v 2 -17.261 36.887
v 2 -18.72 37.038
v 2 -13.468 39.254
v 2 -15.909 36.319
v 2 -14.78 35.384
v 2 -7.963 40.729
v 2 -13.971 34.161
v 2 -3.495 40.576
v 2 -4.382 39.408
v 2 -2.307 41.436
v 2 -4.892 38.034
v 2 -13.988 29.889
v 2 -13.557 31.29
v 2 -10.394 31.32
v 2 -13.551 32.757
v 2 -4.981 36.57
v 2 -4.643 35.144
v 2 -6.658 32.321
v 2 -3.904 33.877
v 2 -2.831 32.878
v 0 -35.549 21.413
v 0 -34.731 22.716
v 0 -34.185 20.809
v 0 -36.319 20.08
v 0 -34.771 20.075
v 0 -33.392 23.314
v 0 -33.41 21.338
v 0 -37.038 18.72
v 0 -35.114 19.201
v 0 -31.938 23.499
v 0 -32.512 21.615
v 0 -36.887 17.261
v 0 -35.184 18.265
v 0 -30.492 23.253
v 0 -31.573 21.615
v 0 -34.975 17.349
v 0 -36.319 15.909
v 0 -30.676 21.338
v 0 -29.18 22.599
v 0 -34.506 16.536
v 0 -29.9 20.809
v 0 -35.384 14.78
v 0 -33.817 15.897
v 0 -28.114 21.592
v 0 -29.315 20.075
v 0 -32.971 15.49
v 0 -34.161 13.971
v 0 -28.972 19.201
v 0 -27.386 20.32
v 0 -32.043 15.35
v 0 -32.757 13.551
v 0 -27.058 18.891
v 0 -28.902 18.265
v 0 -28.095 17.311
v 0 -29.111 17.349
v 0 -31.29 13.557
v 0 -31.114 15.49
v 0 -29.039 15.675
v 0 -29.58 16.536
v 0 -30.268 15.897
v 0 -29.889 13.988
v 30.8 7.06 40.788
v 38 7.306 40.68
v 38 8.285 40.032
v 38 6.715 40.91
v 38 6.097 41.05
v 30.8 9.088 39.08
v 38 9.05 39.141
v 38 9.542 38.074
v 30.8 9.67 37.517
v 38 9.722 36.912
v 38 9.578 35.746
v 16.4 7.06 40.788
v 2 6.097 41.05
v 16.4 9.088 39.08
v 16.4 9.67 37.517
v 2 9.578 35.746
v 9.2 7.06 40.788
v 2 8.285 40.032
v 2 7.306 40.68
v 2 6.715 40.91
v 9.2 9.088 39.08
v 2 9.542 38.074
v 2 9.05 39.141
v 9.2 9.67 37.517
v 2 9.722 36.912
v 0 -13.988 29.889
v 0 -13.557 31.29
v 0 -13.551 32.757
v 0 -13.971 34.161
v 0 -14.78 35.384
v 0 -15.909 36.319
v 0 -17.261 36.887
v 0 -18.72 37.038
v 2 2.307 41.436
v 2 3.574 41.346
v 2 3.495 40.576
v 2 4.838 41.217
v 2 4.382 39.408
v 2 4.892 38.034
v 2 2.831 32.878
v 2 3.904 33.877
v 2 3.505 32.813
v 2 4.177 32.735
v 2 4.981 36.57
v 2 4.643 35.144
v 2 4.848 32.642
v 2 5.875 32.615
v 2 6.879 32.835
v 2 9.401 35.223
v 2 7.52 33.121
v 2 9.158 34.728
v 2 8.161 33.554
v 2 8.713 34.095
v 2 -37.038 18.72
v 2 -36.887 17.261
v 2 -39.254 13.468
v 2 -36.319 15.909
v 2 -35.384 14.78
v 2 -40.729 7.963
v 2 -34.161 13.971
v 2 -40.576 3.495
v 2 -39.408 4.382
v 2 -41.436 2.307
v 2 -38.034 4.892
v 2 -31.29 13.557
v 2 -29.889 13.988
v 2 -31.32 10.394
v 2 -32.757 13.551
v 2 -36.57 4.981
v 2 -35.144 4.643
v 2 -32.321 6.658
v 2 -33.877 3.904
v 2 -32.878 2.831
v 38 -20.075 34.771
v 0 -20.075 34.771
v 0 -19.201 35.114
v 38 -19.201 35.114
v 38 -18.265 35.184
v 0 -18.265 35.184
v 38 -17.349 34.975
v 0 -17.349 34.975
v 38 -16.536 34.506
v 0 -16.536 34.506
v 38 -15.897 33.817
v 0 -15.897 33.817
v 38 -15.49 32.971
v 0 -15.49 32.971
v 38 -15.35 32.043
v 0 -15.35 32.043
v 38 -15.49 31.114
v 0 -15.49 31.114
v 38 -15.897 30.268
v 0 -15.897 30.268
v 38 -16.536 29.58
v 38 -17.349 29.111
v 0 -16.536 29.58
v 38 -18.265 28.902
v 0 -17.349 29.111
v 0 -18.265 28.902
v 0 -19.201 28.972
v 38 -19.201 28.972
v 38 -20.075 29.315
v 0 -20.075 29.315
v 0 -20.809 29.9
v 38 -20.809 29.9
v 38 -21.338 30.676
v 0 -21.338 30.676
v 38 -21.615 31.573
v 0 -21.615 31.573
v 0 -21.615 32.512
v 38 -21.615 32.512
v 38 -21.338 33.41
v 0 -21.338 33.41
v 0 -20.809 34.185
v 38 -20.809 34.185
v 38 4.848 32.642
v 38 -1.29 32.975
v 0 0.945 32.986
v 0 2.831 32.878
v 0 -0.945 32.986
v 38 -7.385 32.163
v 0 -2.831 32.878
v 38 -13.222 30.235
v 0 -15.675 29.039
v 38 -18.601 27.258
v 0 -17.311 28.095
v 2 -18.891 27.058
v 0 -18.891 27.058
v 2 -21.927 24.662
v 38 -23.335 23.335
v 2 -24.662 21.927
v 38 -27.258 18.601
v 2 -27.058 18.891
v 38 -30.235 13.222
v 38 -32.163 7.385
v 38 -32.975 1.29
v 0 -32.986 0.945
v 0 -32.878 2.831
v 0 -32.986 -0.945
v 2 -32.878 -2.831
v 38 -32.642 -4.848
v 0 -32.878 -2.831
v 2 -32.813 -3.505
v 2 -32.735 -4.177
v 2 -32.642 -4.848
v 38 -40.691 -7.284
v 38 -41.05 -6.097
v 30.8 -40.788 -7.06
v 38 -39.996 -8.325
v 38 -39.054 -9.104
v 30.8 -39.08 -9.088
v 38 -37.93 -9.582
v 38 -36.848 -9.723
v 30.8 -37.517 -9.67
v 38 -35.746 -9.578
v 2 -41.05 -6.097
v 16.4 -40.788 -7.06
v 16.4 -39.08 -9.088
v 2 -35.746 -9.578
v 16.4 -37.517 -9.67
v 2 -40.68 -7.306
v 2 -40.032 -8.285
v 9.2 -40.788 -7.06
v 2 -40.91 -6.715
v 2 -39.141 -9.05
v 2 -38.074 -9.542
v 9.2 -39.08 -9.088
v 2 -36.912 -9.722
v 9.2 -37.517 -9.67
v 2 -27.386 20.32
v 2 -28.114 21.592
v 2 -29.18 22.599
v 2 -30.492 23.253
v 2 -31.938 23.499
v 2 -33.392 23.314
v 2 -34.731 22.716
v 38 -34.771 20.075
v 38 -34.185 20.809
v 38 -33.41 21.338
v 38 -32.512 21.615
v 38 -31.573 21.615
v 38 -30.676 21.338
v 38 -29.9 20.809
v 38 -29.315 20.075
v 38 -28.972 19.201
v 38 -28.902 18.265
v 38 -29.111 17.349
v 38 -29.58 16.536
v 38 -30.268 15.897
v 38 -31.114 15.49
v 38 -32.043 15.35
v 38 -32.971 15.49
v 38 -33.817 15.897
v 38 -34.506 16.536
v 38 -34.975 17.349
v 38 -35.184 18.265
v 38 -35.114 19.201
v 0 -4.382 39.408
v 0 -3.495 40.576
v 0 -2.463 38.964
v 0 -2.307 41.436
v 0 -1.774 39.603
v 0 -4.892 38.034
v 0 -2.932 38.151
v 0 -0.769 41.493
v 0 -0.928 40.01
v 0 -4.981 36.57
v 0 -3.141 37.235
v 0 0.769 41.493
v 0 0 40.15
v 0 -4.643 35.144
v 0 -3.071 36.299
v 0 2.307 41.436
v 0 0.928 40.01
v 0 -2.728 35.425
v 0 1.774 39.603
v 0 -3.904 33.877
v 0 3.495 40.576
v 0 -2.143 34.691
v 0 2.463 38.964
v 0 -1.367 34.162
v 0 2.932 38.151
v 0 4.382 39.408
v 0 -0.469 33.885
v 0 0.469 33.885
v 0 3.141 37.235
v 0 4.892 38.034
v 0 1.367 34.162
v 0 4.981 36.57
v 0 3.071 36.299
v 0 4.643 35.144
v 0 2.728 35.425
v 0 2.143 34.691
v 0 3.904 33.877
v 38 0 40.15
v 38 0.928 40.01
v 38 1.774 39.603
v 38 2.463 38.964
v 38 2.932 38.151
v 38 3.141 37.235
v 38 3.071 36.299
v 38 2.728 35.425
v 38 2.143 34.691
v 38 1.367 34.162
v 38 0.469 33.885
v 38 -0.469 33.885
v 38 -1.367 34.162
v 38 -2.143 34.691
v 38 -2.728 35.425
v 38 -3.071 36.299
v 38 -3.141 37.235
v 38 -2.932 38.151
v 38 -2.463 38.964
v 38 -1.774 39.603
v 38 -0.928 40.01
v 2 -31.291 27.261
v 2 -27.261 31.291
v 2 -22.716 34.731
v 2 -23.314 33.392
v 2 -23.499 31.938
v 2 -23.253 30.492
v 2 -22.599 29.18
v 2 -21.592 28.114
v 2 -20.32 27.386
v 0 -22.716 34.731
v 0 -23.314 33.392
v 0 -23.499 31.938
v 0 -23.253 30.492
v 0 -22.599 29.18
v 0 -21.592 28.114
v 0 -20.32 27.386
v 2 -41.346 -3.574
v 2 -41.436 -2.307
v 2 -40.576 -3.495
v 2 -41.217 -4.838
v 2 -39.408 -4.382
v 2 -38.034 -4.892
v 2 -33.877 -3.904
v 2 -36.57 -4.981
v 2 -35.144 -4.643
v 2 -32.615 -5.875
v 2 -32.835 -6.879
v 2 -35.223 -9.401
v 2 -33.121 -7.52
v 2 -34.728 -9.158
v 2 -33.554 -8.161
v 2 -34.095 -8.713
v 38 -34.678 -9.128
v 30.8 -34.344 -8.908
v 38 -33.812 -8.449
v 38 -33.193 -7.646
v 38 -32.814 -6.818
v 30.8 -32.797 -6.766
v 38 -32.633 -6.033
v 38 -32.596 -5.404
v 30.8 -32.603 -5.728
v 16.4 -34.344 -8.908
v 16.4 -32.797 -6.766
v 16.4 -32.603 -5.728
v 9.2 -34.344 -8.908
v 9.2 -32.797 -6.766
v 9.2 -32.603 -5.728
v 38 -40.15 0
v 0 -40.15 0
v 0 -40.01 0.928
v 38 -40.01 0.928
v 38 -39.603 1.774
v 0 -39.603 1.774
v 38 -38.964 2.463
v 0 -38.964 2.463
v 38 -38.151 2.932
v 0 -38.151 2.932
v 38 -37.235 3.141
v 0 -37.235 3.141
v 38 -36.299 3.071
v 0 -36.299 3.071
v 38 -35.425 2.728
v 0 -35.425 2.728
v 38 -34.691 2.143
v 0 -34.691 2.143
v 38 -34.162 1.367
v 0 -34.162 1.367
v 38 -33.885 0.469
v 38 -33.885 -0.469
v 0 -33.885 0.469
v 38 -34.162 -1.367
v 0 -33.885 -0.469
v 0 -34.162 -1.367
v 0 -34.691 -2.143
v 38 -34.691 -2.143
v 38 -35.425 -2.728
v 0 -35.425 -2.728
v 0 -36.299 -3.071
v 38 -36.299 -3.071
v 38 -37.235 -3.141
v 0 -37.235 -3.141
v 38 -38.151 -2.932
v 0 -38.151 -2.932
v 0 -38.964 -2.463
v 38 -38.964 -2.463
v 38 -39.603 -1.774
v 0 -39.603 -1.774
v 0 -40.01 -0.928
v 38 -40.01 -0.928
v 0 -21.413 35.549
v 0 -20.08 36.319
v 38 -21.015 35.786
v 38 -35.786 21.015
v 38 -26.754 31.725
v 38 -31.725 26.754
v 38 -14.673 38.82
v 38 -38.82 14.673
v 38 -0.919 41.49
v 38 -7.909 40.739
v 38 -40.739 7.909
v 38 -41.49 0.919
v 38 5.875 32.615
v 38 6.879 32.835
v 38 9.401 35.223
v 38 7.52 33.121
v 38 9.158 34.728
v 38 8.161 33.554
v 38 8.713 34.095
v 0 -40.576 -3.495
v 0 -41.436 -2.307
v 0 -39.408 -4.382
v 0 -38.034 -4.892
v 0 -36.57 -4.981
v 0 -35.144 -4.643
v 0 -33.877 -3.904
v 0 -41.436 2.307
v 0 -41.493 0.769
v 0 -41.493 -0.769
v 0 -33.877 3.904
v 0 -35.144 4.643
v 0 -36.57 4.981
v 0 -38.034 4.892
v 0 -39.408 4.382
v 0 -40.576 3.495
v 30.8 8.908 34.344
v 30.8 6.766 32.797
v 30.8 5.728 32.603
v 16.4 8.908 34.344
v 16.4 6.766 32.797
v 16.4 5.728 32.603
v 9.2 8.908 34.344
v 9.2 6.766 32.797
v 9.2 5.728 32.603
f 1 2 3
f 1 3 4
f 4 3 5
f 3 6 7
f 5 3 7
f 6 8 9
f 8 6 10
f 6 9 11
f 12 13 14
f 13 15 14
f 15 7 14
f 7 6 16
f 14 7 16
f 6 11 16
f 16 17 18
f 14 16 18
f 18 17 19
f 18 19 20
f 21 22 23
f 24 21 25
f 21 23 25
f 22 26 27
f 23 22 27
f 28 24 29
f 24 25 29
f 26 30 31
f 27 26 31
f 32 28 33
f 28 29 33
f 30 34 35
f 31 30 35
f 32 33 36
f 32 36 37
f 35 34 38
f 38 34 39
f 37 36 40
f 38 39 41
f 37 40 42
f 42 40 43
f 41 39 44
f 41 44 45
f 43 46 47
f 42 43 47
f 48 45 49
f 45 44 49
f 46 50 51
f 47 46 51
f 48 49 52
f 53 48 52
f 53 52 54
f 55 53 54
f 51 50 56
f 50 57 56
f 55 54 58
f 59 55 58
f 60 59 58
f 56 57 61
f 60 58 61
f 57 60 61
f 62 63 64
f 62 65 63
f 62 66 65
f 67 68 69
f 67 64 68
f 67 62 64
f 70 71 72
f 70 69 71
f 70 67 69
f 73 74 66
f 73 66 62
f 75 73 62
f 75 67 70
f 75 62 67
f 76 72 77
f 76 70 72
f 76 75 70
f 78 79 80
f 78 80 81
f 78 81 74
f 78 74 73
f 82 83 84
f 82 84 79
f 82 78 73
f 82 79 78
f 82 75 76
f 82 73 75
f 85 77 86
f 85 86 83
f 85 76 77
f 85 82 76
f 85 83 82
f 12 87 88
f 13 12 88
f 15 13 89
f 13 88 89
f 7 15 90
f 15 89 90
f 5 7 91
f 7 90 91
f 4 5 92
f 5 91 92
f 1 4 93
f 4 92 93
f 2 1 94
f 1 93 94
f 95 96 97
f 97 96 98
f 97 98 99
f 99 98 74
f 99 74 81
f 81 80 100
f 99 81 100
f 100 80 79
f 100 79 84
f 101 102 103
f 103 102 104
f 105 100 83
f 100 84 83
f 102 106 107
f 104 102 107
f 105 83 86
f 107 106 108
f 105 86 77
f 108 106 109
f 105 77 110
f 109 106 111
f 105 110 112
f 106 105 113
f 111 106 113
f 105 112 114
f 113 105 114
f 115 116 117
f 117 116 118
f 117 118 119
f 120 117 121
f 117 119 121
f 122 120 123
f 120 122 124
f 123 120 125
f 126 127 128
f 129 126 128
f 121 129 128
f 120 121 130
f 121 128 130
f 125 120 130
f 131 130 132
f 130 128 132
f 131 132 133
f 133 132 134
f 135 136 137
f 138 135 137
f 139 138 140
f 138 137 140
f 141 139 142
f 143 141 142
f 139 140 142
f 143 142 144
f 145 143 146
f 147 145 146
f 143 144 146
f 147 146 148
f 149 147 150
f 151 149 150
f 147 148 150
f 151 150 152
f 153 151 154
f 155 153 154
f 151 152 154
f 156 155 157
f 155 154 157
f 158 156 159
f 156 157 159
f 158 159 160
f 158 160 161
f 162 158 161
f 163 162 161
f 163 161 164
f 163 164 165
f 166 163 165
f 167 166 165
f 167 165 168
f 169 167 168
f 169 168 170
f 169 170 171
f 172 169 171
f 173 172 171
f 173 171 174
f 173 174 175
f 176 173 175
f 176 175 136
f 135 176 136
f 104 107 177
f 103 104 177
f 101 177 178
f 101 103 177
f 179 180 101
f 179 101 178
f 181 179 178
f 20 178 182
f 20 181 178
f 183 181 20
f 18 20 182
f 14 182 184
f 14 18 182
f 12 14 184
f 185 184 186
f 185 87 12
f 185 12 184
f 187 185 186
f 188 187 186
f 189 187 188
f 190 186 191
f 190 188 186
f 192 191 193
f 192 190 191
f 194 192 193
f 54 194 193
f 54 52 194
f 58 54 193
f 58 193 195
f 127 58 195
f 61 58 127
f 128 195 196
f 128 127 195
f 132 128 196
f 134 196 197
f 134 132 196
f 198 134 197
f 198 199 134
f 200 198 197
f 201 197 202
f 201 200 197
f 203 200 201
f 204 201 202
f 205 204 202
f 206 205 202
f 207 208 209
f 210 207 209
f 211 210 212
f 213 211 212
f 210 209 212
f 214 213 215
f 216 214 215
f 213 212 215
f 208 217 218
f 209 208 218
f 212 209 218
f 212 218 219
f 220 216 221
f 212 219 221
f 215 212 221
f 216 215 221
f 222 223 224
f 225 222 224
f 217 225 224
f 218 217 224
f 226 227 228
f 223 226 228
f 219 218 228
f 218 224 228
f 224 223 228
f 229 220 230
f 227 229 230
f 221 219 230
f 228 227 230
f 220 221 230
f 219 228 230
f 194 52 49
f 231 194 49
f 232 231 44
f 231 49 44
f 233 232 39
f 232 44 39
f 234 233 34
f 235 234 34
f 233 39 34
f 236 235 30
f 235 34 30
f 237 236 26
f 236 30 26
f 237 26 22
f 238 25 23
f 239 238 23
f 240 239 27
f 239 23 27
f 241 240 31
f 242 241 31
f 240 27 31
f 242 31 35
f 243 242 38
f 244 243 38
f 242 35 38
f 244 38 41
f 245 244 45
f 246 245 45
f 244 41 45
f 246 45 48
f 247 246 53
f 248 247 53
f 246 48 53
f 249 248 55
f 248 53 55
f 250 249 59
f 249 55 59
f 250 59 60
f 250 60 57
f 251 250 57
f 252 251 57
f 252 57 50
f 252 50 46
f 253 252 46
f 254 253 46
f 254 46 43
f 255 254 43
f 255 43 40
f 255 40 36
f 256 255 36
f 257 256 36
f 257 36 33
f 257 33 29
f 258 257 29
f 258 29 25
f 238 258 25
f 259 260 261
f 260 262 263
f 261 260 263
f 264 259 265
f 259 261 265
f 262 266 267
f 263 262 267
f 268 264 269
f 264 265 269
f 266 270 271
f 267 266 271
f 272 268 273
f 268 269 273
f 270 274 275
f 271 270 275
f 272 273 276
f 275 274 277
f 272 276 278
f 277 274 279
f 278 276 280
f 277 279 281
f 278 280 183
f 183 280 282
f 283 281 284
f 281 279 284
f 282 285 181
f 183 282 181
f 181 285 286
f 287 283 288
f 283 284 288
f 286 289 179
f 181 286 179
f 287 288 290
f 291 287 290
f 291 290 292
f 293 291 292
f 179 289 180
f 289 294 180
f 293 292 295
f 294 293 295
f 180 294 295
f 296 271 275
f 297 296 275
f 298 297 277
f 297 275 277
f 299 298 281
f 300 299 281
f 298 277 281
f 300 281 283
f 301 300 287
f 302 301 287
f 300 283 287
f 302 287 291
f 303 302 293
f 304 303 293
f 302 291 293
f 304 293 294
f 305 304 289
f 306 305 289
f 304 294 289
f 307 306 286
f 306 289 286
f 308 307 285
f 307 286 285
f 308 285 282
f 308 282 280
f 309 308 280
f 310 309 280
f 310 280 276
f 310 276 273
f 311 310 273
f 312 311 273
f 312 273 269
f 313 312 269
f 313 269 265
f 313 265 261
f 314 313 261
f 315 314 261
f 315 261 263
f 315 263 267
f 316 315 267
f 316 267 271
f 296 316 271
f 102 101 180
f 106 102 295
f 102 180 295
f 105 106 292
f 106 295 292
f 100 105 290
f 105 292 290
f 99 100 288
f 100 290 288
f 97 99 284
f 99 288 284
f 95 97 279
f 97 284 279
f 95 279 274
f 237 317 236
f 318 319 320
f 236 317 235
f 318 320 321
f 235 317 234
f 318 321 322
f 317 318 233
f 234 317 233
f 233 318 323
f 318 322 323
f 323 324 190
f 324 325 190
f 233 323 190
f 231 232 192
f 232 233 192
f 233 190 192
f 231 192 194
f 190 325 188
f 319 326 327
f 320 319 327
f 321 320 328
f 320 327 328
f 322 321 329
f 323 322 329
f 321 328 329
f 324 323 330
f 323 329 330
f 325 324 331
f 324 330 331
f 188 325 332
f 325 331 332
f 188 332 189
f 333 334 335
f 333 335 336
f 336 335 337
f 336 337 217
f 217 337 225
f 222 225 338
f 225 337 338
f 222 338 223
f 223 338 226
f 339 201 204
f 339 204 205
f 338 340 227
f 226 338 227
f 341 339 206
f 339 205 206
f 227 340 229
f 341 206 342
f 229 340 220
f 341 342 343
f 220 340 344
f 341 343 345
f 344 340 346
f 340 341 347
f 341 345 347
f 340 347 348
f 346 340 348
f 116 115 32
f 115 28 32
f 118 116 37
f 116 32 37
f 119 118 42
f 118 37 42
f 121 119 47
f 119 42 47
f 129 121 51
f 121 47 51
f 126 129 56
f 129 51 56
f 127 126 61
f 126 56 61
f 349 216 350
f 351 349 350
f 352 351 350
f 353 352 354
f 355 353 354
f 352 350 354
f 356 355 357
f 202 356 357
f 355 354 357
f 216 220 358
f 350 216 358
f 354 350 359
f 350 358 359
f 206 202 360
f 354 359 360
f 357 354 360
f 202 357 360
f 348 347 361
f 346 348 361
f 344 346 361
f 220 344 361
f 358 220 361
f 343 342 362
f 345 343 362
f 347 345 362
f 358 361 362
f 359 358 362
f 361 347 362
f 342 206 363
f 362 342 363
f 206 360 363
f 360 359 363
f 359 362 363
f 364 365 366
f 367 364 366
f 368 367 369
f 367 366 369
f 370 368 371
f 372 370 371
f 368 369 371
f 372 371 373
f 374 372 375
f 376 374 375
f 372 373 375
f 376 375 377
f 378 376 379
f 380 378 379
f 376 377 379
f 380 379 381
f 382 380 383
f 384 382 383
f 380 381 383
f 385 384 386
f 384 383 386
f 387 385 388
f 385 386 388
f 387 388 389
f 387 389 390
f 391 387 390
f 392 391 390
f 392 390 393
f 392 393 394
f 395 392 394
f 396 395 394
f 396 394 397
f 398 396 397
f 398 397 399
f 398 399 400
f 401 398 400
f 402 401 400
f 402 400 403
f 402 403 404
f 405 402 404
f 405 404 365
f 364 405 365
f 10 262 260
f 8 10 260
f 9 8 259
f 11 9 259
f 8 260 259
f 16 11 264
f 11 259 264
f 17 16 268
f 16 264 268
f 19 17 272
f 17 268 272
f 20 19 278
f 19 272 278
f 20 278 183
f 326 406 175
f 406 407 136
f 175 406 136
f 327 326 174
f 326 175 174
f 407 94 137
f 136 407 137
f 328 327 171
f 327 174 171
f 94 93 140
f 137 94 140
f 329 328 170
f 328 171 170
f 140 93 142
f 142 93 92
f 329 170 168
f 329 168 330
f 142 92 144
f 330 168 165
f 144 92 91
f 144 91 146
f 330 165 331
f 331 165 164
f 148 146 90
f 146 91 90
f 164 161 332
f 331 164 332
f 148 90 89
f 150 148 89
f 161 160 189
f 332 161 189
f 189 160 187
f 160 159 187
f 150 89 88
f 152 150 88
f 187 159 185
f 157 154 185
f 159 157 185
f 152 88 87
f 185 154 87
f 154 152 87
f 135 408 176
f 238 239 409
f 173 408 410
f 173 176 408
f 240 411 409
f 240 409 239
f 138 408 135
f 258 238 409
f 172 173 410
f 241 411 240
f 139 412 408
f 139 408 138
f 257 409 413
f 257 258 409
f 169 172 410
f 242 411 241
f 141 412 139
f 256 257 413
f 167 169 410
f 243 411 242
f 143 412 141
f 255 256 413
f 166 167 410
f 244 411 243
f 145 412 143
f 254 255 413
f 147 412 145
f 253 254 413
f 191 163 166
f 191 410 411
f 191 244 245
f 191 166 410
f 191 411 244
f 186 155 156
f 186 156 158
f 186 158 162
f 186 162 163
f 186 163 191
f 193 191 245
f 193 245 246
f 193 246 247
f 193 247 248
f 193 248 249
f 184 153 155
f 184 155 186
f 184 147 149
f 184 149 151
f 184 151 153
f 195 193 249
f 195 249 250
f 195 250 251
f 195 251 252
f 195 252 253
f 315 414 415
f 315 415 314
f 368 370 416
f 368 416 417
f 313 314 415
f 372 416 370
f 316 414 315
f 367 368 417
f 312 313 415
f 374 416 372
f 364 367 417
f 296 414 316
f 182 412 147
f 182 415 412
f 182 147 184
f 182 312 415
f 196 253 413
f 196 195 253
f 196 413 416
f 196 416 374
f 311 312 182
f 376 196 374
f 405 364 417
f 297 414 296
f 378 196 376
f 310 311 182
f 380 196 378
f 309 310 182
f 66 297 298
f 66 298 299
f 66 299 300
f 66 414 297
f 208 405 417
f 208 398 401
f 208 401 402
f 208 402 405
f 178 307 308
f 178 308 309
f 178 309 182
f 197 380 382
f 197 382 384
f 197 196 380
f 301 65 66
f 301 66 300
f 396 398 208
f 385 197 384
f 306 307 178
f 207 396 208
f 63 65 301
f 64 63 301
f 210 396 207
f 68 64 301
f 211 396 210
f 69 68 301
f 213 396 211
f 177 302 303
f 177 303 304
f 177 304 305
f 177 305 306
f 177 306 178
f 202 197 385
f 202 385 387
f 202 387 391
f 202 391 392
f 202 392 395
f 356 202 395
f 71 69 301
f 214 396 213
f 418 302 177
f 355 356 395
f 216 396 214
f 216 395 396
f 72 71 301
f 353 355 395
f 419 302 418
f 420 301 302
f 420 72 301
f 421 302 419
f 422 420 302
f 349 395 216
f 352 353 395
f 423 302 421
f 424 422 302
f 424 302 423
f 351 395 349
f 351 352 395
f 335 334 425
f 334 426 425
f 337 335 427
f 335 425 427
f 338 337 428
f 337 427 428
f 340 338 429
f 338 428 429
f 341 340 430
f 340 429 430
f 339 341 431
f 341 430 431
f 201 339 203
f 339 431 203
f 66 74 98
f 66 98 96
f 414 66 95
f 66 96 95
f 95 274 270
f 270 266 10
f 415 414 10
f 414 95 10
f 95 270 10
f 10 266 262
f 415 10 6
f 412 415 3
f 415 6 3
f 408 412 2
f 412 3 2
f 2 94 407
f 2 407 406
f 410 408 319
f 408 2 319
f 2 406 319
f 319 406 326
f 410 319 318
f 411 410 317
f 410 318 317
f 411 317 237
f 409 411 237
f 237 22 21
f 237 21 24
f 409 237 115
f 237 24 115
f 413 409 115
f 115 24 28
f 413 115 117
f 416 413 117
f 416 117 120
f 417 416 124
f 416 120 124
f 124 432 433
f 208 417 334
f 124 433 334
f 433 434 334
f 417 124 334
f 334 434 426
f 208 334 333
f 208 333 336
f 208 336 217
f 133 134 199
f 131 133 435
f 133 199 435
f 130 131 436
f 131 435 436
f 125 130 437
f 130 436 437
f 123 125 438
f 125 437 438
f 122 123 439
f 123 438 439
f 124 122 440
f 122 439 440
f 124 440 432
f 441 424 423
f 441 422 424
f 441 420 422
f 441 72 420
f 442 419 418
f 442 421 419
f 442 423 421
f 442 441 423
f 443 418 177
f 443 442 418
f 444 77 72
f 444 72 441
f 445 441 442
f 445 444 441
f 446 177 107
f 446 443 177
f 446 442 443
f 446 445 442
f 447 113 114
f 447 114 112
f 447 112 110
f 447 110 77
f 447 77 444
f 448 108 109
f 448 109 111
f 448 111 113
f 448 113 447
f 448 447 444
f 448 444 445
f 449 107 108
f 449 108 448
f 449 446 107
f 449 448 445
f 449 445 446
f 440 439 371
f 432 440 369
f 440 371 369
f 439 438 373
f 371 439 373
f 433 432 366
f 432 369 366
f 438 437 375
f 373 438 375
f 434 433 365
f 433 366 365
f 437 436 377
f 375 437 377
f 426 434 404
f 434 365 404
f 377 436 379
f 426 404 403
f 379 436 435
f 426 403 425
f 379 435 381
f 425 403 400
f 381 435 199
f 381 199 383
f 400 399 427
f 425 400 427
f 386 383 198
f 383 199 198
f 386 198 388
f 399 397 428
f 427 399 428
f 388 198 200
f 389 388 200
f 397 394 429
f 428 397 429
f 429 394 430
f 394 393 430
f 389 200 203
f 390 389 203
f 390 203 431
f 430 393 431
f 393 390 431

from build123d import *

# Parameters (mm, degrees)
SKETCH_1_R               = 41.5
SKETCH_1_R_2             = 33
EXTRUDE_1_DEPTH          = 38
SKETCH_2_R               = 3.15
CUT_EXTRUDE_1_DEPTH      = 70.91780889
PATTERN_CIRCULAR_1_COUNT = 4
PATTERN_CIRCULAR_1_ANGLE = 90
CUT_EXTRUDE_2_DEPTH      = 38
FILLET_START             = -1
FILLET_1_DEPTH           = 40
FILLET_2_DEPTH           = 38
SKETCH_4_OUTSIDE_W       = 69.583
SKETCH_4_OUTSIDE_H       = 69.583
SKETCH_4_OUTSIDE_R       = 5
CUT_EXTRUDE_3_DEPTH      = 2


with BuildPart() as part:
    # 草图1 → 凸台-拉伸1 (new body)
    with BuildSketch(Plane(origin=(0, 0, 0), x_dir=(0, 0, -1), z_dir=(1, 0, 0))):
        Circle(SKETCH_1_R)
        Circle(SKETCH_1_R_2, mode=Mode.SUBTRACT)
    extrude(amount=EXTRUDE_1_DEPTH)

    # 草图2 → 切除-拉伸1 (cut, through all)
    with BuildSketch(Plane.ZY):
        with Locations((37, 0)):
            Circle(SKETCH_2_R)
    cut_extrude_1 = extrude(amount=-CUT_EXTRUDE_1_DEPTH, mode=Mode.SUBTRACT)

    # 阵列(圆周)1: 切除-拉伸1 ×4 about axis
    pattern_circular_1_axis = Axis((0, 0, 0), (1, 0, 0))
    for i in range(1, PATTERN_CIRCULAR_1_COUNT):
        add(cut_extrude_1.rotate(pattern_circular_1_axis, i * PATTERN_CIRCULAR_1_ANGLE / (PATTERN_CIRCULAR_1_COUNT - 1)), mode=Mode.SUBTRACT)

    # 草图3 → 切除-拉伸2 (cut)
    with BuildSketch(Plane.ZY):
        with BuildLine():
            Line((40.085921791, 10.740990372), (0, 0))
            Line((0, 0), (-10.740990372, -40.085921791))
            ThreePointArc((-10.740990372, -40.085921791), (-29.344931419, 29.344931419), (40.085921791, 10.740990372))
        make_face()
    extrude(amount=-CUT_EXTRUDE_2_DEPTH, mode=Mode.SUBTRACT)

    # 圆角1: read off the stored shape, not the designer's step
    # 圆角1 outline → 圆角1 (cut)
    with BuildSketch(Plane.YZ.offset(FILLET_START)):
        with BuildLine():
            ThreePointArc((10.740990372, 40.085921791), (8.43291814, 40.634171477), (6.097289766, 41.049641381))
            add(Edge.make_bspline(
                [(6.097289766, 41.049641381), (7.224539758, 40.882205817), (8.479546293, 40.316443685), (9.579562271, 39.181662294), (10.053171447, 37.518946615), (9.578053286, 35.745781503)],
                knots=[0, 0, 0, 0, 0, 0, 0.528616925, 0.528616925, 0.528616925, 0.528616925, 0.528616925, 0.528616925], degree=5, weights=[1, 0.78855323, 0.632993631, 0.533321202, 0.489535944, 0.501637857]))
            Line((9.578053286, 35.745781503), (10.740990372, 40.085921791))
        make_face()
        with BuildLine():
            Line((8.541028488, 31.875552268), (9.578053286, 35.745781503))
            add(Edge.make_bspline(
                [(9.578053286, 35.745781503), (9.173304992, 34.235240304), (8.196828695, 33.153640695), (6.985664176, 32.610562324), (5.825288873, 32.496788788), (4.848447284, 32.641883508)],
                knots=[0.528616925, 0.528616925, 0.528616925, 0.528616925, 0.528616925, 0.528616925, 1, 1, 1, 1, 1, 1], degree=5, weights=[0.501637857, 0.512429484, 0.567661512, 0.667333941, 0.81144677, 1]))
            ThreePointArc((4.848447284, 32.641883508), (6.705693943, 32.31150985), (8.541028488, 31.875552268))
        make_face()
    extrude(amount=FILLET_1_DEPTH, mode=Mode.SUBTRACT)

    # 圆角2: read off the stored shape, not the designer's step
    # 圆角2 outline → 圆角2 (cut)
    with BuildSketch(Plane.YZ):
        with BuildLine():
            add(Edge.make_bspline(
                [(-41.049641381, -6.097289766), (-40.882205817, -7.224539758), (-40.316443685, -8.479546293), (-39.181662294, -9.579562271), (-37.518946615, -10.053171446), (-35.745781503, -9.578053286)],
                knots=[0, 0, 0, 0, 0, 0, 0.528616925, 0.528616925, 0.528616925, 0.528616925, 0.528616925, 0.528616925], degree=5, weights=[1, 0.78855323, 0.632993631, 0.533321202, 0.489535944, 0.501637857]))
            ThreePointArc((-41.049641381, -6.097289766), (-40.634171477, -8.43291814), (-40.085921791, -10.740990372))
            Line((-40.085921791, -10.740990372), (-35.745781503, -9.578053286))
        make_face()
        with BuildLine():
            add(Edge.make_bspline(
                [(-35.745781503, -9.578053286), (-34.235240304, -9.173304992), (-33.153640695, -8.196828695), (-32.610562324, -6.985664176), (-32.496788788, -5.825288873), (-32.641883508, -4.848447284)],
                knots=[0.528616925, 0.528616925, 0.528616925, 0.528616925, 0.528616925, 0.528616925, 1, 1, 1, 1, 1, 1], degree=5, weights=[0.501637857, 0.512429484, 0.567661512, 0.667333941, 0.81144677, 1]))
            Line((-35.745781503, -9.578053286), (-31.875552268, -8.541028488))
            ThreePointArc((-31.875552268, -8.541028488), (-32.31150985, -6.705693943), (-32.641883508, -4.848447284))
        make_face()
    extrude(amount=FILLET_2_DEPTH, mode=Mode.SUBTRACT)

    # 草图4 outside → 切除-拉伸3 (cut)
    with BuildSketch(Plane(origin=(0, 0, 0), x_dir=(0, 0, -1), z_dir=(1, 0, 0))):
        with Locations((-15.8885, -15.8885)):
            Rectangle(SKETCH_4_OUTSIDE_W, SKETCH_4_OUTSIDE_H)
        with Locations((-18.5, -32.04293994)):
            Circle(SKETCH_4_OUTSIDE_R, mode=Mode.SUBTRACT)
        with Locations((-37, 0)):
            Circle(SKETCH_4_OUTSIDE_R, mode=Mode.SUBTRACT)
        with Locations((0, -37)):
            Circle(SKETCH_4_OUTSIDE_R, mode=Mode.SUBTRACT)
        with Locations((-32.04293994, -18.5)):
            Circle(SKETCH_4_OUTSIDE_R, mode=Mode.SUBTRACT)
    extrude(amount=CUT_EXTRUDE_3_DEPTH, mode=Mode.SUBTRACT)


solid = part.part
